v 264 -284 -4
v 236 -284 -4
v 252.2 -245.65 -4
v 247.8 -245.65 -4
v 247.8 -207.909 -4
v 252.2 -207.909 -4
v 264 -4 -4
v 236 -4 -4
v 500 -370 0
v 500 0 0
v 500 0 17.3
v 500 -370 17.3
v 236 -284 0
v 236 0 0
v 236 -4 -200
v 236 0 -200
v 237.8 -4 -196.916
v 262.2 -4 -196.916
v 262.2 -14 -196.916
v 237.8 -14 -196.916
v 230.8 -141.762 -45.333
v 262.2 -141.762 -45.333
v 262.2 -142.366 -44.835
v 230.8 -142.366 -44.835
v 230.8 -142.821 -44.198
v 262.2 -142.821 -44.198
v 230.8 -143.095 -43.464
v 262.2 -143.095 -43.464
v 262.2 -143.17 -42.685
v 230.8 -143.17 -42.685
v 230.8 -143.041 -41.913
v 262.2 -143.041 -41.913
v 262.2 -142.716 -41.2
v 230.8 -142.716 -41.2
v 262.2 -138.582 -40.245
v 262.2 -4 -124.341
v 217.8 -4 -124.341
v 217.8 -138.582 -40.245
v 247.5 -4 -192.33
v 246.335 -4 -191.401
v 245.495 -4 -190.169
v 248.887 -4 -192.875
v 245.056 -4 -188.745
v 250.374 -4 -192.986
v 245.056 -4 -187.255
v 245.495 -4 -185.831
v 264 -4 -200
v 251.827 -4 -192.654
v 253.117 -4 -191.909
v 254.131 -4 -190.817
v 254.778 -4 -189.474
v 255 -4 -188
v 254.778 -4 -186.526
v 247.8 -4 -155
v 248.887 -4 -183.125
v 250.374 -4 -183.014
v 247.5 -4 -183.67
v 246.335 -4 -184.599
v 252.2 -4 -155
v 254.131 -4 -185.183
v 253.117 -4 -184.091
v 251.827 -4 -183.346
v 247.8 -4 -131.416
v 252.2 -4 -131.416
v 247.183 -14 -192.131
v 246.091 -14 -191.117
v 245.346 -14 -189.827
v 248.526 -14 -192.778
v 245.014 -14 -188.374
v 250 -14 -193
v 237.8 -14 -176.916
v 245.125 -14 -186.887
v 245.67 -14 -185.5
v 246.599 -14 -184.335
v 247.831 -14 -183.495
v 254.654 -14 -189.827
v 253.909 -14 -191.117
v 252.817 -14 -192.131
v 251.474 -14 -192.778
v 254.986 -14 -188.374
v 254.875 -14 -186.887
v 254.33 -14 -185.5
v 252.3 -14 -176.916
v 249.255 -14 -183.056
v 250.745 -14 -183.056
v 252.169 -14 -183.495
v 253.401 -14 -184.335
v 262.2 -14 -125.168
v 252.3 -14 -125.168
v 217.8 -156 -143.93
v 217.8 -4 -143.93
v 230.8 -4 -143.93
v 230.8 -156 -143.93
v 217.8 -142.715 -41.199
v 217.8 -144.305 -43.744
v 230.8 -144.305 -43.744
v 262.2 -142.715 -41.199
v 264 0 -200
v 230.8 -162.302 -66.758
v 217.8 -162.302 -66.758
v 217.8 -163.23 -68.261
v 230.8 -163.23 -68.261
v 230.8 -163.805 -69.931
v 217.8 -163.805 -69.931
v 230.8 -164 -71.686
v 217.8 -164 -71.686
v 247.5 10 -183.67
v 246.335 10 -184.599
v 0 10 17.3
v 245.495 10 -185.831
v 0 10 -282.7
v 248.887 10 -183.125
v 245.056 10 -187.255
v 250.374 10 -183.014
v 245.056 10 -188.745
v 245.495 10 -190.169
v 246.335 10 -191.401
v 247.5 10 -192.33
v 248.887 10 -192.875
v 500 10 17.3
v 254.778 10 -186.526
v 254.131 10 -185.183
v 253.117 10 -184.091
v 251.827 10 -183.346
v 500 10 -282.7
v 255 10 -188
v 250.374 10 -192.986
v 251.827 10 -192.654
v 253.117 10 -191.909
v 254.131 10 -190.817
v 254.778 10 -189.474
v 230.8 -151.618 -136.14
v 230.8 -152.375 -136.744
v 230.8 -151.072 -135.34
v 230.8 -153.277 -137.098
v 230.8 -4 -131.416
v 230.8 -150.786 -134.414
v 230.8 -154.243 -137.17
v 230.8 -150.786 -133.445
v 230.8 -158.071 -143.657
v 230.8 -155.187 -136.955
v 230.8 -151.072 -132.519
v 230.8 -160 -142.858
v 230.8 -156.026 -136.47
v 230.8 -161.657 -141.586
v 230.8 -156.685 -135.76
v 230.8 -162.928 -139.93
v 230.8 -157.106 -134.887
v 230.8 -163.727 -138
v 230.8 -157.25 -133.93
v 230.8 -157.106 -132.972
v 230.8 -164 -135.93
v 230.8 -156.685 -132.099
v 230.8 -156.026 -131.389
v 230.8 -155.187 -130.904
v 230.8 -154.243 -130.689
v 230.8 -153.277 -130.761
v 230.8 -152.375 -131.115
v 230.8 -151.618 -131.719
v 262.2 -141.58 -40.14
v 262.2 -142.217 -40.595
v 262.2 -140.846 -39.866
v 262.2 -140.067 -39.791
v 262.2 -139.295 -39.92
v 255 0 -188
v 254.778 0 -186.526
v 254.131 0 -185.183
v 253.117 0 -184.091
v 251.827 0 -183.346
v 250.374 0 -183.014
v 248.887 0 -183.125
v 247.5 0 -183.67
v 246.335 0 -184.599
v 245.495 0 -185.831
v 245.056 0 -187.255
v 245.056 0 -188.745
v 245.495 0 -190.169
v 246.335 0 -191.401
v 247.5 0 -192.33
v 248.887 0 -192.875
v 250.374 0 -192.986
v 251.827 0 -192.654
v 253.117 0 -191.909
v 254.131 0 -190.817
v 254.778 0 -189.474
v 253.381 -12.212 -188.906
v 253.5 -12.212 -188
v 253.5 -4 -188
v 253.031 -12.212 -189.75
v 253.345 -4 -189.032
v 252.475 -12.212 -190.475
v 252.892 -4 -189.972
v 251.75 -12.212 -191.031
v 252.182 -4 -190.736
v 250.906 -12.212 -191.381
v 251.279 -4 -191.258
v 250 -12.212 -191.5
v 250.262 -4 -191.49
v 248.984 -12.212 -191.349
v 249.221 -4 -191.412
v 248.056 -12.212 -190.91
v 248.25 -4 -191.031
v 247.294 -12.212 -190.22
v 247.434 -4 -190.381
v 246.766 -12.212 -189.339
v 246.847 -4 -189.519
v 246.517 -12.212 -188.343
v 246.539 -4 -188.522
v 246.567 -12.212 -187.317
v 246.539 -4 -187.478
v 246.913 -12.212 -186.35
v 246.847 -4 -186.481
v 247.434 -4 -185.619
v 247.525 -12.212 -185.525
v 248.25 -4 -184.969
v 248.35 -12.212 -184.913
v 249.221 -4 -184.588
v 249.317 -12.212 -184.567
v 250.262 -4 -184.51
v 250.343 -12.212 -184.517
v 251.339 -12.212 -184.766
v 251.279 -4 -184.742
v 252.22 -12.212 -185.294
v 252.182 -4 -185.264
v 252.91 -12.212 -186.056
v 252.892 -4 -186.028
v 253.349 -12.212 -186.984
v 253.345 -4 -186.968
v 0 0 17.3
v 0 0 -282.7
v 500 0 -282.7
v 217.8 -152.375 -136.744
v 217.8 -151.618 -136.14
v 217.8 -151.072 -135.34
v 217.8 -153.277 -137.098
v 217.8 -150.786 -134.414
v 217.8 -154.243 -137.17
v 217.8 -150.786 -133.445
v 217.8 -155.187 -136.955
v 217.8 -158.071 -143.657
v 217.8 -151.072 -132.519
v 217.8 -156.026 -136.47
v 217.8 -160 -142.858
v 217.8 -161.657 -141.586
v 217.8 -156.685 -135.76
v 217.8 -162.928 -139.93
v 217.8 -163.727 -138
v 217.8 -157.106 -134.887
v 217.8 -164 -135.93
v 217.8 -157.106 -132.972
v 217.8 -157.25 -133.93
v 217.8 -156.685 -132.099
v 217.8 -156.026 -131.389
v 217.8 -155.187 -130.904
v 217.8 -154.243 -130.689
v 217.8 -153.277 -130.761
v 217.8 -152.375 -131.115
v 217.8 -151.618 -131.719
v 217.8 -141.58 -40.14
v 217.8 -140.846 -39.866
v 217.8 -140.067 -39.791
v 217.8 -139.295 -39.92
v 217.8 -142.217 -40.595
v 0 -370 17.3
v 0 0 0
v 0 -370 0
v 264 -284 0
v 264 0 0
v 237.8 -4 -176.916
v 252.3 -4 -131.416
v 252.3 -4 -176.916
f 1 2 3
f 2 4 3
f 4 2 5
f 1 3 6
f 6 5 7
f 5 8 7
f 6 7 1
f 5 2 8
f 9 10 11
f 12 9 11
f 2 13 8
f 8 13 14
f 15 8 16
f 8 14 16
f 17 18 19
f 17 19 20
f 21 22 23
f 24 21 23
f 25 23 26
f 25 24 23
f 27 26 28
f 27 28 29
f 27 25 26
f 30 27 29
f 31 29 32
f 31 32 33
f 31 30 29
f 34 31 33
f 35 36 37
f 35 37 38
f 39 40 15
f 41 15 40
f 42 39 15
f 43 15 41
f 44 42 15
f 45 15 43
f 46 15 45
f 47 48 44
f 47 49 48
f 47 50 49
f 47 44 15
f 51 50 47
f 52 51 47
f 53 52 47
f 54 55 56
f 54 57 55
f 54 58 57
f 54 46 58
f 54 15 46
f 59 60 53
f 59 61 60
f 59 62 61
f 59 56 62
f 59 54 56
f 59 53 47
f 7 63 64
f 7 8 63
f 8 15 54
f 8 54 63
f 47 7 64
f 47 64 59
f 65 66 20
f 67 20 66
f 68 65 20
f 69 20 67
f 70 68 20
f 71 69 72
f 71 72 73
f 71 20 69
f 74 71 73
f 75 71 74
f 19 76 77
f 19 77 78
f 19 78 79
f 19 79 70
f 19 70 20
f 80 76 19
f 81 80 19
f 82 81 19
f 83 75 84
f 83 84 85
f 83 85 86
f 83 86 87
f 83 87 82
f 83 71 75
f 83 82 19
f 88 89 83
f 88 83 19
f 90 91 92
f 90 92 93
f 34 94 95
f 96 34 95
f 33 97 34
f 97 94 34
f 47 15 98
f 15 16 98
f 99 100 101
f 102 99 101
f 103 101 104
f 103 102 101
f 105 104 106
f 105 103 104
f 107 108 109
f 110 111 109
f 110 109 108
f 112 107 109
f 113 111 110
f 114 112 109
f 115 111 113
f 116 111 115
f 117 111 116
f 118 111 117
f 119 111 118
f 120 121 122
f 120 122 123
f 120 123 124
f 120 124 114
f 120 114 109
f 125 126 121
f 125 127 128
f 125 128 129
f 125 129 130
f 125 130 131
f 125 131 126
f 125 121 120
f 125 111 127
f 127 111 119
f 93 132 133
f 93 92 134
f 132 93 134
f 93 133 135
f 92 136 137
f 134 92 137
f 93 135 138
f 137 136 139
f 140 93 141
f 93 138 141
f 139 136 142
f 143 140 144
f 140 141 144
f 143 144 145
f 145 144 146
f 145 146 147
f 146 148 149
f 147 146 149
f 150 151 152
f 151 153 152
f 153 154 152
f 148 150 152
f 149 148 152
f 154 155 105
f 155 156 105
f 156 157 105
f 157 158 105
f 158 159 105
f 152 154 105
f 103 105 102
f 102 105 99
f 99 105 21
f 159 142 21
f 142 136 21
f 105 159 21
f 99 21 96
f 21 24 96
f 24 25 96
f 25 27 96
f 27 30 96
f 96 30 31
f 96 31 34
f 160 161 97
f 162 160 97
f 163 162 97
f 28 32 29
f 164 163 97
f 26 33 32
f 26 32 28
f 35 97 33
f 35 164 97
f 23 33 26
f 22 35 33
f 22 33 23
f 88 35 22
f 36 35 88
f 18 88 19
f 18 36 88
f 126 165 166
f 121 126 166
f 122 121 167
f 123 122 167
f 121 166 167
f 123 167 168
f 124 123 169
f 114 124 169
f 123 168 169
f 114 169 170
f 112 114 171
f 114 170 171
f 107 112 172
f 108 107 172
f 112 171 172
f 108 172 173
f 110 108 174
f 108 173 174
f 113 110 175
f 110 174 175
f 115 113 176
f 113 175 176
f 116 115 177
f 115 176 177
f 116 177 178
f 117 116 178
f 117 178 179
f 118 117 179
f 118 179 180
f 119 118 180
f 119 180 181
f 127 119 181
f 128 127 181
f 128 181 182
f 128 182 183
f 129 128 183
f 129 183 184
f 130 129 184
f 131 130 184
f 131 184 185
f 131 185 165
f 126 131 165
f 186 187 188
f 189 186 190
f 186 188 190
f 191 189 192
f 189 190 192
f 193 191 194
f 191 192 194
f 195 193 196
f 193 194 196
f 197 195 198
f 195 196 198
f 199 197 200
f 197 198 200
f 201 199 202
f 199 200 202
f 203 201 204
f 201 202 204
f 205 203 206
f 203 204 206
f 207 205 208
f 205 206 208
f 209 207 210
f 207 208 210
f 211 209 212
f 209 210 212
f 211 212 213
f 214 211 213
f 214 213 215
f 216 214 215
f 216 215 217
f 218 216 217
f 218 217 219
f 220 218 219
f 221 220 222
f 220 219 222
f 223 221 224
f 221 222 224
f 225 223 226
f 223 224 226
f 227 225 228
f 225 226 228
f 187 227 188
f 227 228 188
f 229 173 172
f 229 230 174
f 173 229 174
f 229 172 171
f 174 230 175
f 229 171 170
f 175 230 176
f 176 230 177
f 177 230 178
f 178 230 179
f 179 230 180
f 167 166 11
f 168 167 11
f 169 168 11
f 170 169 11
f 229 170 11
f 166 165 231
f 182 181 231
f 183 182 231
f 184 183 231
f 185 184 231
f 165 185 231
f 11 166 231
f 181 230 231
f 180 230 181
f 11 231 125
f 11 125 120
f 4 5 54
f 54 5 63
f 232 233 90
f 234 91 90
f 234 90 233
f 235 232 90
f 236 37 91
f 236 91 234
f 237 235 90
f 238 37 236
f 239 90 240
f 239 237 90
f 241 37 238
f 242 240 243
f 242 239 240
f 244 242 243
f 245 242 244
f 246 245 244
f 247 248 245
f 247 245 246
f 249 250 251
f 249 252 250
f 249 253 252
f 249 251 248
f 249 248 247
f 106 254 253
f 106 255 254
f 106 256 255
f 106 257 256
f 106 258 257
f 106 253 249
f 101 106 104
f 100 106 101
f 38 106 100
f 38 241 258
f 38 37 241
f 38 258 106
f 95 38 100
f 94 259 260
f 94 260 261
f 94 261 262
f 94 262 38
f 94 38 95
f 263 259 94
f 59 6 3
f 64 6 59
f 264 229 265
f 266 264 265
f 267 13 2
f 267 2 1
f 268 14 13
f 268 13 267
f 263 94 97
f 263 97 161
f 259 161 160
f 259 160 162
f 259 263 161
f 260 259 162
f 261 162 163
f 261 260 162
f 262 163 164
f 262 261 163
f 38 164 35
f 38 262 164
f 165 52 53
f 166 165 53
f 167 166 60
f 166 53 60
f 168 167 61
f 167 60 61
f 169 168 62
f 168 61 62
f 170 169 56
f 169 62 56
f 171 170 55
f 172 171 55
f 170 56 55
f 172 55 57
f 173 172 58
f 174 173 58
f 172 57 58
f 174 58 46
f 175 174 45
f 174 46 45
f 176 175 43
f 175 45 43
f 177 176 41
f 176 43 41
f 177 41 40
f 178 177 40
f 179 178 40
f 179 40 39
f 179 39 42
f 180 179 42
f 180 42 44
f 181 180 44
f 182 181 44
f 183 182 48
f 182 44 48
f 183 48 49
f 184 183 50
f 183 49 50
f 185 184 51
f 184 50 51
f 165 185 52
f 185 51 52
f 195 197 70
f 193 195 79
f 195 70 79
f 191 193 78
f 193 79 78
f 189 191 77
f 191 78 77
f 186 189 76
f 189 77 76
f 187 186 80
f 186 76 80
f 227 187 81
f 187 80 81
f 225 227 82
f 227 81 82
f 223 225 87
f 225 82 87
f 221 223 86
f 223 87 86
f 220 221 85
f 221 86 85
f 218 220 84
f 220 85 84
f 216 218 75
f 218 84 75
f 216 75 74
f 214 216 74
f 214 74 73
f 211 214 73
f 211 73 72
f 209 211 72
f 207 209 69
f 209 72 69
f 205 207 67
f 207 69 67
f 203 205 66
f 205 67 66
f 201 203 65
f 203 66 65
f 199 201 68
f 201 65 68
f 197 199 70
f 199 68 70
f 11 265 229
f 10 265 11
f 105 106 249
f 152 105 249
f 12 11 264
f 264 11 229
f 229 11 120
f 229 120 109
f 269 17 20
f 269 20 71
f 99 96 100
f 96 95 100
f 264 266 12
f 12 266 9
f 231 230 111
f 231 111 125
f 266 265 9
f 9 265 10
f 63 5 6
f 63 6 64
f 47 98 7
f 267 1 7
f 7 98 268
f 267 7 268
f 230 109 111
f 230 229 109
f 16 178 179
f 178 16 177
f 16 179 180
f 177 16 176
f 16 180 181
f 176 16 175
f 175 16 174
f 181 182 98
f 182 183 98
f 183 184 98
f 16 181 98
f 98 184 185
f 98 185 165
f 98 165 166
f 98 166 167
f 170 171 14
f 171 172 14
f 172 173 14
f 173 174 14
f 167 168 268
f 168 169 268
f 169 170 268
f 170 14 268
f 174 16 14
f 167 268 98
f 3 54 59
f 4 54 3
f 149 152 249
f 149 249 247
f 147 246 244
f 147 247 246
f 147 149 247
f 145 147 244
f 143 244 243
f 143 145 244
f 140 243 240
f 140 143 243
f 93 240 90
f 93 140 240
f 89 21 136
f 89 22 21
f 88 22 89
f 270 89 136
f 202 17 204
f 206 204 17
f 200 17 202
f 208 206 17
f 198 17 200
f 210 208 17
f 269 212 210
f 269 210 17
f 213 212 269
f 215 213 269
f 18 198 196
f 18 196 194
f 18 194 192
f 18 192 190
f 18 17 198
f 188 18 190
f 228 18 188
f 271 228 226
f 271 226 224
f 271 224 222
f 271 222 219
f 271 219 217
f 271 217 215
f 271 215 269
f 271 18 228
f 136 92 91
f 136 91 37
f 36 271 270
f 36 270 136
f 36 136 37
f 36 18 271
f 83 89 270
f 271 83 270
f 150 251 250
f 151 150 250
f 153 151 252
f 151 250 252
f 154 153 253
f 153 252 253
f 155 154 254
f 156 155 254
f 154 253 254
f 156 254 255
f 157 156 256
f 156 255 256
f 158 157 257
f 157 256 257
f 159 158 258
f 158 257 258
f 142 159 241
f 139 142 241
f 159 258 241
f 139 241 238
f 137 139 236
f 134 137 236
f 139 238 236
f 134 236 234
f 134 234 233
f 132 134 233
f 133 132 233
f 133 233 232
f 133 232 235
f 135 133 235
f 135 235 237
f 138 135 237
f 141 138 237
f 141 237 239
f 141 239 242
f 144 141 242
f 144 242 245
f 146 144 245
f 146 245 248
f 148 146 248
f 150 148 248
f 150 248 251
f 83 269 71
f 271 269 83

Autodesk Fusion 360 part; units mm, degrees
sketch "Sketch1" plane through (0, 0, 0) normal (0, 1, 0) x (1, 0, 0) in component "Shelf"
  line L0 (0, 0) -> (500, 0)
  line L1 (500, 0) -> (500, -17.3)
  line L2 (500, -17.3) -> (0, -17.3)
  line L3 (0, -17.3) -> (0, 0)
  line L4 (0, -17.3) -> (0, 282.7)
  line L5 (0, 282.7) -> (500, 282.7)
  line L6 (500, 282.7) -> (500, -17.3)
  dimension "d1" = 500
  dimension "d2" = 17.3
  dimension "d5" = 300
extrude "Extrude1" add sketch "Sketch1" against normal blind 370 contours L0 L1 L2 L3 L4 L6 makes body 1 in component "Shelf"
extrude "Extrude2" add sketch "Sketch1" along normal blind 10 separate body makes body 2 in component "Shelf"
sketch "Sketch2" plane through (0, 0, 0) normal (0, -1, 0) x (1, 0, 0) in component "Shelf"
  line L0 (0, -282.7) -> (500, -282.7)
  line L1 (500, -282.7) -> (500, 17.3)
  line L2 (500, 17.3) -> (0, 17.3)
  line L3 (0, 17.3) -> (0, -282.7)
  line L4 (0, 0) -> (500, 0)
  line L5 (500, 0) -> (0, 0)
  line L6 (236, 0) -> (236, -200)
  line L7 (236, -200) -> (264, -200)
  line L8 (264, -200) -> (264, 0)
  line L9 (250, -200) -> (250, 200) construction
  dimension "d8" = 200
  dimension "d9" = 28
extrude "Extrude3" add sketch "Sketch2" along normal blind 4 separate body contours L4 L5 L6 L7 L8 makes body 3 in component "Shelf"
sketch "Sketch3" plane through (0, -4, 0) normal (0, -1, 0) x (1, 0, 0) in component "Shelf"
  line L0 (264, -200) -> (264, 0)
  line L1 (264, 0) -> (236, 0)
  line L2 (236, 0) -> (236, -200)
  line L3 (236, -200) -> (264, -200)
  line L4 (236, -4) -> (264, -4)
  dimension "d12" = 4
extrude "Extrude4" add sketch "Sketch3" along normal blind 280 contours L0 L1 L2 L4 bodies 3 in component "Shelf"
ref_plane "WorkPlane1" through (250, 0, 0) normal (1, 0, 0) x (0, 1, 0) in component "Shelf"
sketch "Sketch4" plane through (250, 0, 0) normal (1, 0, 0) x (0, 1, 0) in component "Shelf"
  line L0 (-4, -155) -> (-245.6505, -4)
  line L1 (-4, -4) -> (-284, -4)
  line L2 (-4, -4) -> (-4, -200)
  line L3 (-4, -155) -> (-186.4554, -155) construction
  line L4 (0, 0) -> (-370, 0) construction
  line L5 (-207.9089, -4) -> (-4, -131.4164)
  line L6 (-4, -131.4164) -> (-4, -155)
  line L7 (-207.9089, -4) -> (-245.6505, -4)
  dimension "d16" = 32
  dimension "d17" = 155
  dimension "d19" = 20
extrude "Extrude5" add sketch "Sketch4" along normal mid plane 4.4 contours L0 L1 L2 L5 L6 L7 bodies 3 in component "Shelf"
sketch "Sketch1 (2)" plane through (247.8, 0, 0) normal (-1, 0, 0) x (0, -1, 0) in component "Mount"
  line L0 (207.9089, -4) -> (4, -131.4164)
  line L1 (4, -131.4164) -> (4, -155)
  line L2 (4, -155) -> (245.6505, -4)
  line L3 (245.6505, -4) -> (207.9089, -4)
  line L4 (0, 0) -> (0, -200)
  line L5 (0, -200) -> (4, -200)
  line L6 (4, -200) -> (4, -4)
  line L7 (4, -4) -> (284, -4)
  line L8 (284, -4) -> (284, 0)
  line L9 (284, 0) -> (0, 0)
  line L10 (4, -124.3414) -> (141.1258, -38.6557)
  line L11 (141.1258, -38.6557) -> (144.3053, -43.7439)
  dimension "d22" = 75
  dimension "d23" = 6
sketch "Sketch5" plane through (0, -4, 0) normal (0, -1, 0) x (1, 0, 0) in component "Shelf"
  line L0 (247.8, -155) -> (247.8, -131.4164)
  line L1 (247.8, -131.4164) -> (252.2, -131.4164)
  line L2 (252.2, -131.4164) -> (252.2, -155)
  line L3 (252.2, -155) -> (247.8, -155)
  line L4 (264, -4) -> (236, -4)
  line L5 (236, -4) -> (236, -200)
  line L6 (236, -200) -> (264, -200)
  line L7 (264, -200) -> (264, -4)
  circle A0 centre (250, -188) radius 5
  line L8 (250, -155) -> (250, -197.5396) construction
  dimension "d31" = 10
  dimension "d32" = 33
extrude "Extrude5'" add sketch "Sketch1 (2)" against normal blind 14.4 separate body contours L0 L6 L10 L11 makes body 4 in component "Mount"
sketch "Sketch6" plane through (262.2, 0, 0) normal (1, 0, 0) x (0, 1, 0) in component "Mount"
  line L0 (-4, -124.3414) -> (-141.1258, -38.6557)
  line L1 (-141.1258, -38.6557) -> (-144.3053, -43.7439)
  line L2 (-144.3053, -43.7439) -> (-4, -131.4164)
  line L3 (-4, -131.4164) -> (-4, -124.3414)
  line L4 (-4, -131.4164) -> (-4, -156.4164)
  line L5 (-4, -155) -> (-245.6505, -4)
  line L6 (-14, -148.7513) -> (-14, -176.9164)
  line L7 (-4, -200) -> (-4, -4)
  line L8 (-14, -176.9164) -> (-4, -176.9164)
  line L9 (-14, -148.7513) -> (-14, -125.1677)
  line L10 (-144.3053, -43.7439) -> (-155.9635, -62.401)
  line L11 (-155.9635, -62.401) -> (-14, -151.1097)
  dimension "d43" = 25
  dimension "d44" = 10
  dimension "d46" = 20.5
  dimension "d79" = 22
extrude "Extrude6" add sketch "Sketch6" against normal blind 9.9 contours L2 L4 L5 L7 L9 | L4 L5 L6 L7 L8 bodies 4 in component "Mount"
sketch "Sketch7" plane through (0, -4, 0) normal (0, -1, 0) x (1, 0, 0) in component "Mount"
  line L0 (247.8, -155) -> (247.8, -131.4164)
  line L1 (247.8, -131.4164) -> (252.2, -131.4164)
  line L2 (252.2, -131.4164) -> (252.2, -155)
  line L3 (252.2, -155) -> (247.8, -155)
  line L4 (264, -4) -> (236, -4)
  line L5 (236, -4) -> (236, -200)
  line L6 (236, -200) -> (264, -200)
  line L7 (264, -200) -> (264, -4)
  circle A0 centre (250, -188) radius 3.5
  line L8 (250, -155) -> (250, -238.8329) construction
  line L9 (262.2, -176.9164) -> (252.3, -176.9164)
  line L10 (262.2, -176.9164) -> (262.2, -196.9164)
  line L11 (262.2, -196.9164) -> (237.8, -196.9164)
  line L12 (237.8, -196.9164) -> (237.8, -176.9164)
  line L13 (237.8, -176.9164) -> (252.3, -176.9164)
  dimension "d49" = 7
  dimension "d50" = 33
  dimension "d51" = 20
extrude "Extrude7" add sketch "Sketch7" along normal blind 6 contours L9 L10 L11 L12 L13 bodies 4 in component "Mount"
extrude "Extrude8" add 1 faces at (247.8, -50.7684, -99.8339) along direction (-1, 0, 0) blind 30 on bodies 4 bodies 4 in component "Mount"
sketch "Sketch8" plane through (217.8, 0, 0) normal (-1, 0, 0) x (0, -1, 0) in component "Mount"
  line L0 (141.1258, -38.6557) -> (4, -124.3414)
  line L1 (4, -124.3414) -> (4, -131.4164)
  line L2 (4, -131.4164) -> (144.3053, -43.7439)
  line L3 (144.3053, -43.7439) -> (141.1258, -38.6557)
  line L4 (104, -68.9295) -> (204, -68.9295) construction
  line L5 (104, -68.9295) -> (164, -68.9295)
  line L6 (164, -68.9295) -> (164, -143.9295)
  line L7 (104, -68.9295) -> (104, -143.9295)
  line L8 (104, -143.9295) -> (164, -143.9295)
  line L9 (154, -68.9295) -> (154, -165.7492) construction
  line L10 (4, -4) -> (4, -200)
  circle A0 centre (154, -133.9295) radius 3.25
  line L11 (144.3053, -43.7439) -> (164, -68.9295)
  line L12 (4, -131.4164) -> (4, -143.9295)
  line L13 (4, -143.9295) -> (104, -143.9295)
  dimension "d56" = 100
  dimension "d57" = 60
  dimension "d58" = 75
  dimension "d59" = 50
  dimension "d60" = 100
  dimension "d61" = 6.5
  dimension "d63" = 65
extrude "Extrude9" add sketch "Sketch8" against normal blind 13 contours L2 L5 L11 | L2 L7 L10 L12 L13 | L5 L6 L7 L8 bodies 4 in component "Mount"
extrude "Extrude10" add 1 faces at (259.287, -10, -187.1037) along direction (0, -1, 0) blind 4 on bodies 4 bodies 4 in component "Mount"
hole "Hole1" at (250, -14, -188) direction (0, 1, 0) diameter 7 depth 10 tip angle 118 countersink diameter 10 countersink angle 80 bodies 4 in component "Mount"
fillet "Fillet1" radius 8 2 edges at (224.3, -164, -68.9295) (224.3, -164, -143.9295) on bodies 4 in component "Mount"
fillet "Fillet2" radius 3 2 edges at (240, -141.1258, -38.6557) (246.5, -144.3053, -43.7439) on bodies 4 in component "Mount"
extrude "Extrude6'" cut sketch "Sketch5" against normal blind 80 contours A0 bodies 2 3 in component "Shelf"
component "Shelf" placed x (1, 0, 0) y (0, 1, 0) z (0, 0, 1) at (0, 0, 0)
component "Mount" placed x (1, 0, 0) y (0, 1, 0) z (0, 0, 1) at (0, 0, 0)
